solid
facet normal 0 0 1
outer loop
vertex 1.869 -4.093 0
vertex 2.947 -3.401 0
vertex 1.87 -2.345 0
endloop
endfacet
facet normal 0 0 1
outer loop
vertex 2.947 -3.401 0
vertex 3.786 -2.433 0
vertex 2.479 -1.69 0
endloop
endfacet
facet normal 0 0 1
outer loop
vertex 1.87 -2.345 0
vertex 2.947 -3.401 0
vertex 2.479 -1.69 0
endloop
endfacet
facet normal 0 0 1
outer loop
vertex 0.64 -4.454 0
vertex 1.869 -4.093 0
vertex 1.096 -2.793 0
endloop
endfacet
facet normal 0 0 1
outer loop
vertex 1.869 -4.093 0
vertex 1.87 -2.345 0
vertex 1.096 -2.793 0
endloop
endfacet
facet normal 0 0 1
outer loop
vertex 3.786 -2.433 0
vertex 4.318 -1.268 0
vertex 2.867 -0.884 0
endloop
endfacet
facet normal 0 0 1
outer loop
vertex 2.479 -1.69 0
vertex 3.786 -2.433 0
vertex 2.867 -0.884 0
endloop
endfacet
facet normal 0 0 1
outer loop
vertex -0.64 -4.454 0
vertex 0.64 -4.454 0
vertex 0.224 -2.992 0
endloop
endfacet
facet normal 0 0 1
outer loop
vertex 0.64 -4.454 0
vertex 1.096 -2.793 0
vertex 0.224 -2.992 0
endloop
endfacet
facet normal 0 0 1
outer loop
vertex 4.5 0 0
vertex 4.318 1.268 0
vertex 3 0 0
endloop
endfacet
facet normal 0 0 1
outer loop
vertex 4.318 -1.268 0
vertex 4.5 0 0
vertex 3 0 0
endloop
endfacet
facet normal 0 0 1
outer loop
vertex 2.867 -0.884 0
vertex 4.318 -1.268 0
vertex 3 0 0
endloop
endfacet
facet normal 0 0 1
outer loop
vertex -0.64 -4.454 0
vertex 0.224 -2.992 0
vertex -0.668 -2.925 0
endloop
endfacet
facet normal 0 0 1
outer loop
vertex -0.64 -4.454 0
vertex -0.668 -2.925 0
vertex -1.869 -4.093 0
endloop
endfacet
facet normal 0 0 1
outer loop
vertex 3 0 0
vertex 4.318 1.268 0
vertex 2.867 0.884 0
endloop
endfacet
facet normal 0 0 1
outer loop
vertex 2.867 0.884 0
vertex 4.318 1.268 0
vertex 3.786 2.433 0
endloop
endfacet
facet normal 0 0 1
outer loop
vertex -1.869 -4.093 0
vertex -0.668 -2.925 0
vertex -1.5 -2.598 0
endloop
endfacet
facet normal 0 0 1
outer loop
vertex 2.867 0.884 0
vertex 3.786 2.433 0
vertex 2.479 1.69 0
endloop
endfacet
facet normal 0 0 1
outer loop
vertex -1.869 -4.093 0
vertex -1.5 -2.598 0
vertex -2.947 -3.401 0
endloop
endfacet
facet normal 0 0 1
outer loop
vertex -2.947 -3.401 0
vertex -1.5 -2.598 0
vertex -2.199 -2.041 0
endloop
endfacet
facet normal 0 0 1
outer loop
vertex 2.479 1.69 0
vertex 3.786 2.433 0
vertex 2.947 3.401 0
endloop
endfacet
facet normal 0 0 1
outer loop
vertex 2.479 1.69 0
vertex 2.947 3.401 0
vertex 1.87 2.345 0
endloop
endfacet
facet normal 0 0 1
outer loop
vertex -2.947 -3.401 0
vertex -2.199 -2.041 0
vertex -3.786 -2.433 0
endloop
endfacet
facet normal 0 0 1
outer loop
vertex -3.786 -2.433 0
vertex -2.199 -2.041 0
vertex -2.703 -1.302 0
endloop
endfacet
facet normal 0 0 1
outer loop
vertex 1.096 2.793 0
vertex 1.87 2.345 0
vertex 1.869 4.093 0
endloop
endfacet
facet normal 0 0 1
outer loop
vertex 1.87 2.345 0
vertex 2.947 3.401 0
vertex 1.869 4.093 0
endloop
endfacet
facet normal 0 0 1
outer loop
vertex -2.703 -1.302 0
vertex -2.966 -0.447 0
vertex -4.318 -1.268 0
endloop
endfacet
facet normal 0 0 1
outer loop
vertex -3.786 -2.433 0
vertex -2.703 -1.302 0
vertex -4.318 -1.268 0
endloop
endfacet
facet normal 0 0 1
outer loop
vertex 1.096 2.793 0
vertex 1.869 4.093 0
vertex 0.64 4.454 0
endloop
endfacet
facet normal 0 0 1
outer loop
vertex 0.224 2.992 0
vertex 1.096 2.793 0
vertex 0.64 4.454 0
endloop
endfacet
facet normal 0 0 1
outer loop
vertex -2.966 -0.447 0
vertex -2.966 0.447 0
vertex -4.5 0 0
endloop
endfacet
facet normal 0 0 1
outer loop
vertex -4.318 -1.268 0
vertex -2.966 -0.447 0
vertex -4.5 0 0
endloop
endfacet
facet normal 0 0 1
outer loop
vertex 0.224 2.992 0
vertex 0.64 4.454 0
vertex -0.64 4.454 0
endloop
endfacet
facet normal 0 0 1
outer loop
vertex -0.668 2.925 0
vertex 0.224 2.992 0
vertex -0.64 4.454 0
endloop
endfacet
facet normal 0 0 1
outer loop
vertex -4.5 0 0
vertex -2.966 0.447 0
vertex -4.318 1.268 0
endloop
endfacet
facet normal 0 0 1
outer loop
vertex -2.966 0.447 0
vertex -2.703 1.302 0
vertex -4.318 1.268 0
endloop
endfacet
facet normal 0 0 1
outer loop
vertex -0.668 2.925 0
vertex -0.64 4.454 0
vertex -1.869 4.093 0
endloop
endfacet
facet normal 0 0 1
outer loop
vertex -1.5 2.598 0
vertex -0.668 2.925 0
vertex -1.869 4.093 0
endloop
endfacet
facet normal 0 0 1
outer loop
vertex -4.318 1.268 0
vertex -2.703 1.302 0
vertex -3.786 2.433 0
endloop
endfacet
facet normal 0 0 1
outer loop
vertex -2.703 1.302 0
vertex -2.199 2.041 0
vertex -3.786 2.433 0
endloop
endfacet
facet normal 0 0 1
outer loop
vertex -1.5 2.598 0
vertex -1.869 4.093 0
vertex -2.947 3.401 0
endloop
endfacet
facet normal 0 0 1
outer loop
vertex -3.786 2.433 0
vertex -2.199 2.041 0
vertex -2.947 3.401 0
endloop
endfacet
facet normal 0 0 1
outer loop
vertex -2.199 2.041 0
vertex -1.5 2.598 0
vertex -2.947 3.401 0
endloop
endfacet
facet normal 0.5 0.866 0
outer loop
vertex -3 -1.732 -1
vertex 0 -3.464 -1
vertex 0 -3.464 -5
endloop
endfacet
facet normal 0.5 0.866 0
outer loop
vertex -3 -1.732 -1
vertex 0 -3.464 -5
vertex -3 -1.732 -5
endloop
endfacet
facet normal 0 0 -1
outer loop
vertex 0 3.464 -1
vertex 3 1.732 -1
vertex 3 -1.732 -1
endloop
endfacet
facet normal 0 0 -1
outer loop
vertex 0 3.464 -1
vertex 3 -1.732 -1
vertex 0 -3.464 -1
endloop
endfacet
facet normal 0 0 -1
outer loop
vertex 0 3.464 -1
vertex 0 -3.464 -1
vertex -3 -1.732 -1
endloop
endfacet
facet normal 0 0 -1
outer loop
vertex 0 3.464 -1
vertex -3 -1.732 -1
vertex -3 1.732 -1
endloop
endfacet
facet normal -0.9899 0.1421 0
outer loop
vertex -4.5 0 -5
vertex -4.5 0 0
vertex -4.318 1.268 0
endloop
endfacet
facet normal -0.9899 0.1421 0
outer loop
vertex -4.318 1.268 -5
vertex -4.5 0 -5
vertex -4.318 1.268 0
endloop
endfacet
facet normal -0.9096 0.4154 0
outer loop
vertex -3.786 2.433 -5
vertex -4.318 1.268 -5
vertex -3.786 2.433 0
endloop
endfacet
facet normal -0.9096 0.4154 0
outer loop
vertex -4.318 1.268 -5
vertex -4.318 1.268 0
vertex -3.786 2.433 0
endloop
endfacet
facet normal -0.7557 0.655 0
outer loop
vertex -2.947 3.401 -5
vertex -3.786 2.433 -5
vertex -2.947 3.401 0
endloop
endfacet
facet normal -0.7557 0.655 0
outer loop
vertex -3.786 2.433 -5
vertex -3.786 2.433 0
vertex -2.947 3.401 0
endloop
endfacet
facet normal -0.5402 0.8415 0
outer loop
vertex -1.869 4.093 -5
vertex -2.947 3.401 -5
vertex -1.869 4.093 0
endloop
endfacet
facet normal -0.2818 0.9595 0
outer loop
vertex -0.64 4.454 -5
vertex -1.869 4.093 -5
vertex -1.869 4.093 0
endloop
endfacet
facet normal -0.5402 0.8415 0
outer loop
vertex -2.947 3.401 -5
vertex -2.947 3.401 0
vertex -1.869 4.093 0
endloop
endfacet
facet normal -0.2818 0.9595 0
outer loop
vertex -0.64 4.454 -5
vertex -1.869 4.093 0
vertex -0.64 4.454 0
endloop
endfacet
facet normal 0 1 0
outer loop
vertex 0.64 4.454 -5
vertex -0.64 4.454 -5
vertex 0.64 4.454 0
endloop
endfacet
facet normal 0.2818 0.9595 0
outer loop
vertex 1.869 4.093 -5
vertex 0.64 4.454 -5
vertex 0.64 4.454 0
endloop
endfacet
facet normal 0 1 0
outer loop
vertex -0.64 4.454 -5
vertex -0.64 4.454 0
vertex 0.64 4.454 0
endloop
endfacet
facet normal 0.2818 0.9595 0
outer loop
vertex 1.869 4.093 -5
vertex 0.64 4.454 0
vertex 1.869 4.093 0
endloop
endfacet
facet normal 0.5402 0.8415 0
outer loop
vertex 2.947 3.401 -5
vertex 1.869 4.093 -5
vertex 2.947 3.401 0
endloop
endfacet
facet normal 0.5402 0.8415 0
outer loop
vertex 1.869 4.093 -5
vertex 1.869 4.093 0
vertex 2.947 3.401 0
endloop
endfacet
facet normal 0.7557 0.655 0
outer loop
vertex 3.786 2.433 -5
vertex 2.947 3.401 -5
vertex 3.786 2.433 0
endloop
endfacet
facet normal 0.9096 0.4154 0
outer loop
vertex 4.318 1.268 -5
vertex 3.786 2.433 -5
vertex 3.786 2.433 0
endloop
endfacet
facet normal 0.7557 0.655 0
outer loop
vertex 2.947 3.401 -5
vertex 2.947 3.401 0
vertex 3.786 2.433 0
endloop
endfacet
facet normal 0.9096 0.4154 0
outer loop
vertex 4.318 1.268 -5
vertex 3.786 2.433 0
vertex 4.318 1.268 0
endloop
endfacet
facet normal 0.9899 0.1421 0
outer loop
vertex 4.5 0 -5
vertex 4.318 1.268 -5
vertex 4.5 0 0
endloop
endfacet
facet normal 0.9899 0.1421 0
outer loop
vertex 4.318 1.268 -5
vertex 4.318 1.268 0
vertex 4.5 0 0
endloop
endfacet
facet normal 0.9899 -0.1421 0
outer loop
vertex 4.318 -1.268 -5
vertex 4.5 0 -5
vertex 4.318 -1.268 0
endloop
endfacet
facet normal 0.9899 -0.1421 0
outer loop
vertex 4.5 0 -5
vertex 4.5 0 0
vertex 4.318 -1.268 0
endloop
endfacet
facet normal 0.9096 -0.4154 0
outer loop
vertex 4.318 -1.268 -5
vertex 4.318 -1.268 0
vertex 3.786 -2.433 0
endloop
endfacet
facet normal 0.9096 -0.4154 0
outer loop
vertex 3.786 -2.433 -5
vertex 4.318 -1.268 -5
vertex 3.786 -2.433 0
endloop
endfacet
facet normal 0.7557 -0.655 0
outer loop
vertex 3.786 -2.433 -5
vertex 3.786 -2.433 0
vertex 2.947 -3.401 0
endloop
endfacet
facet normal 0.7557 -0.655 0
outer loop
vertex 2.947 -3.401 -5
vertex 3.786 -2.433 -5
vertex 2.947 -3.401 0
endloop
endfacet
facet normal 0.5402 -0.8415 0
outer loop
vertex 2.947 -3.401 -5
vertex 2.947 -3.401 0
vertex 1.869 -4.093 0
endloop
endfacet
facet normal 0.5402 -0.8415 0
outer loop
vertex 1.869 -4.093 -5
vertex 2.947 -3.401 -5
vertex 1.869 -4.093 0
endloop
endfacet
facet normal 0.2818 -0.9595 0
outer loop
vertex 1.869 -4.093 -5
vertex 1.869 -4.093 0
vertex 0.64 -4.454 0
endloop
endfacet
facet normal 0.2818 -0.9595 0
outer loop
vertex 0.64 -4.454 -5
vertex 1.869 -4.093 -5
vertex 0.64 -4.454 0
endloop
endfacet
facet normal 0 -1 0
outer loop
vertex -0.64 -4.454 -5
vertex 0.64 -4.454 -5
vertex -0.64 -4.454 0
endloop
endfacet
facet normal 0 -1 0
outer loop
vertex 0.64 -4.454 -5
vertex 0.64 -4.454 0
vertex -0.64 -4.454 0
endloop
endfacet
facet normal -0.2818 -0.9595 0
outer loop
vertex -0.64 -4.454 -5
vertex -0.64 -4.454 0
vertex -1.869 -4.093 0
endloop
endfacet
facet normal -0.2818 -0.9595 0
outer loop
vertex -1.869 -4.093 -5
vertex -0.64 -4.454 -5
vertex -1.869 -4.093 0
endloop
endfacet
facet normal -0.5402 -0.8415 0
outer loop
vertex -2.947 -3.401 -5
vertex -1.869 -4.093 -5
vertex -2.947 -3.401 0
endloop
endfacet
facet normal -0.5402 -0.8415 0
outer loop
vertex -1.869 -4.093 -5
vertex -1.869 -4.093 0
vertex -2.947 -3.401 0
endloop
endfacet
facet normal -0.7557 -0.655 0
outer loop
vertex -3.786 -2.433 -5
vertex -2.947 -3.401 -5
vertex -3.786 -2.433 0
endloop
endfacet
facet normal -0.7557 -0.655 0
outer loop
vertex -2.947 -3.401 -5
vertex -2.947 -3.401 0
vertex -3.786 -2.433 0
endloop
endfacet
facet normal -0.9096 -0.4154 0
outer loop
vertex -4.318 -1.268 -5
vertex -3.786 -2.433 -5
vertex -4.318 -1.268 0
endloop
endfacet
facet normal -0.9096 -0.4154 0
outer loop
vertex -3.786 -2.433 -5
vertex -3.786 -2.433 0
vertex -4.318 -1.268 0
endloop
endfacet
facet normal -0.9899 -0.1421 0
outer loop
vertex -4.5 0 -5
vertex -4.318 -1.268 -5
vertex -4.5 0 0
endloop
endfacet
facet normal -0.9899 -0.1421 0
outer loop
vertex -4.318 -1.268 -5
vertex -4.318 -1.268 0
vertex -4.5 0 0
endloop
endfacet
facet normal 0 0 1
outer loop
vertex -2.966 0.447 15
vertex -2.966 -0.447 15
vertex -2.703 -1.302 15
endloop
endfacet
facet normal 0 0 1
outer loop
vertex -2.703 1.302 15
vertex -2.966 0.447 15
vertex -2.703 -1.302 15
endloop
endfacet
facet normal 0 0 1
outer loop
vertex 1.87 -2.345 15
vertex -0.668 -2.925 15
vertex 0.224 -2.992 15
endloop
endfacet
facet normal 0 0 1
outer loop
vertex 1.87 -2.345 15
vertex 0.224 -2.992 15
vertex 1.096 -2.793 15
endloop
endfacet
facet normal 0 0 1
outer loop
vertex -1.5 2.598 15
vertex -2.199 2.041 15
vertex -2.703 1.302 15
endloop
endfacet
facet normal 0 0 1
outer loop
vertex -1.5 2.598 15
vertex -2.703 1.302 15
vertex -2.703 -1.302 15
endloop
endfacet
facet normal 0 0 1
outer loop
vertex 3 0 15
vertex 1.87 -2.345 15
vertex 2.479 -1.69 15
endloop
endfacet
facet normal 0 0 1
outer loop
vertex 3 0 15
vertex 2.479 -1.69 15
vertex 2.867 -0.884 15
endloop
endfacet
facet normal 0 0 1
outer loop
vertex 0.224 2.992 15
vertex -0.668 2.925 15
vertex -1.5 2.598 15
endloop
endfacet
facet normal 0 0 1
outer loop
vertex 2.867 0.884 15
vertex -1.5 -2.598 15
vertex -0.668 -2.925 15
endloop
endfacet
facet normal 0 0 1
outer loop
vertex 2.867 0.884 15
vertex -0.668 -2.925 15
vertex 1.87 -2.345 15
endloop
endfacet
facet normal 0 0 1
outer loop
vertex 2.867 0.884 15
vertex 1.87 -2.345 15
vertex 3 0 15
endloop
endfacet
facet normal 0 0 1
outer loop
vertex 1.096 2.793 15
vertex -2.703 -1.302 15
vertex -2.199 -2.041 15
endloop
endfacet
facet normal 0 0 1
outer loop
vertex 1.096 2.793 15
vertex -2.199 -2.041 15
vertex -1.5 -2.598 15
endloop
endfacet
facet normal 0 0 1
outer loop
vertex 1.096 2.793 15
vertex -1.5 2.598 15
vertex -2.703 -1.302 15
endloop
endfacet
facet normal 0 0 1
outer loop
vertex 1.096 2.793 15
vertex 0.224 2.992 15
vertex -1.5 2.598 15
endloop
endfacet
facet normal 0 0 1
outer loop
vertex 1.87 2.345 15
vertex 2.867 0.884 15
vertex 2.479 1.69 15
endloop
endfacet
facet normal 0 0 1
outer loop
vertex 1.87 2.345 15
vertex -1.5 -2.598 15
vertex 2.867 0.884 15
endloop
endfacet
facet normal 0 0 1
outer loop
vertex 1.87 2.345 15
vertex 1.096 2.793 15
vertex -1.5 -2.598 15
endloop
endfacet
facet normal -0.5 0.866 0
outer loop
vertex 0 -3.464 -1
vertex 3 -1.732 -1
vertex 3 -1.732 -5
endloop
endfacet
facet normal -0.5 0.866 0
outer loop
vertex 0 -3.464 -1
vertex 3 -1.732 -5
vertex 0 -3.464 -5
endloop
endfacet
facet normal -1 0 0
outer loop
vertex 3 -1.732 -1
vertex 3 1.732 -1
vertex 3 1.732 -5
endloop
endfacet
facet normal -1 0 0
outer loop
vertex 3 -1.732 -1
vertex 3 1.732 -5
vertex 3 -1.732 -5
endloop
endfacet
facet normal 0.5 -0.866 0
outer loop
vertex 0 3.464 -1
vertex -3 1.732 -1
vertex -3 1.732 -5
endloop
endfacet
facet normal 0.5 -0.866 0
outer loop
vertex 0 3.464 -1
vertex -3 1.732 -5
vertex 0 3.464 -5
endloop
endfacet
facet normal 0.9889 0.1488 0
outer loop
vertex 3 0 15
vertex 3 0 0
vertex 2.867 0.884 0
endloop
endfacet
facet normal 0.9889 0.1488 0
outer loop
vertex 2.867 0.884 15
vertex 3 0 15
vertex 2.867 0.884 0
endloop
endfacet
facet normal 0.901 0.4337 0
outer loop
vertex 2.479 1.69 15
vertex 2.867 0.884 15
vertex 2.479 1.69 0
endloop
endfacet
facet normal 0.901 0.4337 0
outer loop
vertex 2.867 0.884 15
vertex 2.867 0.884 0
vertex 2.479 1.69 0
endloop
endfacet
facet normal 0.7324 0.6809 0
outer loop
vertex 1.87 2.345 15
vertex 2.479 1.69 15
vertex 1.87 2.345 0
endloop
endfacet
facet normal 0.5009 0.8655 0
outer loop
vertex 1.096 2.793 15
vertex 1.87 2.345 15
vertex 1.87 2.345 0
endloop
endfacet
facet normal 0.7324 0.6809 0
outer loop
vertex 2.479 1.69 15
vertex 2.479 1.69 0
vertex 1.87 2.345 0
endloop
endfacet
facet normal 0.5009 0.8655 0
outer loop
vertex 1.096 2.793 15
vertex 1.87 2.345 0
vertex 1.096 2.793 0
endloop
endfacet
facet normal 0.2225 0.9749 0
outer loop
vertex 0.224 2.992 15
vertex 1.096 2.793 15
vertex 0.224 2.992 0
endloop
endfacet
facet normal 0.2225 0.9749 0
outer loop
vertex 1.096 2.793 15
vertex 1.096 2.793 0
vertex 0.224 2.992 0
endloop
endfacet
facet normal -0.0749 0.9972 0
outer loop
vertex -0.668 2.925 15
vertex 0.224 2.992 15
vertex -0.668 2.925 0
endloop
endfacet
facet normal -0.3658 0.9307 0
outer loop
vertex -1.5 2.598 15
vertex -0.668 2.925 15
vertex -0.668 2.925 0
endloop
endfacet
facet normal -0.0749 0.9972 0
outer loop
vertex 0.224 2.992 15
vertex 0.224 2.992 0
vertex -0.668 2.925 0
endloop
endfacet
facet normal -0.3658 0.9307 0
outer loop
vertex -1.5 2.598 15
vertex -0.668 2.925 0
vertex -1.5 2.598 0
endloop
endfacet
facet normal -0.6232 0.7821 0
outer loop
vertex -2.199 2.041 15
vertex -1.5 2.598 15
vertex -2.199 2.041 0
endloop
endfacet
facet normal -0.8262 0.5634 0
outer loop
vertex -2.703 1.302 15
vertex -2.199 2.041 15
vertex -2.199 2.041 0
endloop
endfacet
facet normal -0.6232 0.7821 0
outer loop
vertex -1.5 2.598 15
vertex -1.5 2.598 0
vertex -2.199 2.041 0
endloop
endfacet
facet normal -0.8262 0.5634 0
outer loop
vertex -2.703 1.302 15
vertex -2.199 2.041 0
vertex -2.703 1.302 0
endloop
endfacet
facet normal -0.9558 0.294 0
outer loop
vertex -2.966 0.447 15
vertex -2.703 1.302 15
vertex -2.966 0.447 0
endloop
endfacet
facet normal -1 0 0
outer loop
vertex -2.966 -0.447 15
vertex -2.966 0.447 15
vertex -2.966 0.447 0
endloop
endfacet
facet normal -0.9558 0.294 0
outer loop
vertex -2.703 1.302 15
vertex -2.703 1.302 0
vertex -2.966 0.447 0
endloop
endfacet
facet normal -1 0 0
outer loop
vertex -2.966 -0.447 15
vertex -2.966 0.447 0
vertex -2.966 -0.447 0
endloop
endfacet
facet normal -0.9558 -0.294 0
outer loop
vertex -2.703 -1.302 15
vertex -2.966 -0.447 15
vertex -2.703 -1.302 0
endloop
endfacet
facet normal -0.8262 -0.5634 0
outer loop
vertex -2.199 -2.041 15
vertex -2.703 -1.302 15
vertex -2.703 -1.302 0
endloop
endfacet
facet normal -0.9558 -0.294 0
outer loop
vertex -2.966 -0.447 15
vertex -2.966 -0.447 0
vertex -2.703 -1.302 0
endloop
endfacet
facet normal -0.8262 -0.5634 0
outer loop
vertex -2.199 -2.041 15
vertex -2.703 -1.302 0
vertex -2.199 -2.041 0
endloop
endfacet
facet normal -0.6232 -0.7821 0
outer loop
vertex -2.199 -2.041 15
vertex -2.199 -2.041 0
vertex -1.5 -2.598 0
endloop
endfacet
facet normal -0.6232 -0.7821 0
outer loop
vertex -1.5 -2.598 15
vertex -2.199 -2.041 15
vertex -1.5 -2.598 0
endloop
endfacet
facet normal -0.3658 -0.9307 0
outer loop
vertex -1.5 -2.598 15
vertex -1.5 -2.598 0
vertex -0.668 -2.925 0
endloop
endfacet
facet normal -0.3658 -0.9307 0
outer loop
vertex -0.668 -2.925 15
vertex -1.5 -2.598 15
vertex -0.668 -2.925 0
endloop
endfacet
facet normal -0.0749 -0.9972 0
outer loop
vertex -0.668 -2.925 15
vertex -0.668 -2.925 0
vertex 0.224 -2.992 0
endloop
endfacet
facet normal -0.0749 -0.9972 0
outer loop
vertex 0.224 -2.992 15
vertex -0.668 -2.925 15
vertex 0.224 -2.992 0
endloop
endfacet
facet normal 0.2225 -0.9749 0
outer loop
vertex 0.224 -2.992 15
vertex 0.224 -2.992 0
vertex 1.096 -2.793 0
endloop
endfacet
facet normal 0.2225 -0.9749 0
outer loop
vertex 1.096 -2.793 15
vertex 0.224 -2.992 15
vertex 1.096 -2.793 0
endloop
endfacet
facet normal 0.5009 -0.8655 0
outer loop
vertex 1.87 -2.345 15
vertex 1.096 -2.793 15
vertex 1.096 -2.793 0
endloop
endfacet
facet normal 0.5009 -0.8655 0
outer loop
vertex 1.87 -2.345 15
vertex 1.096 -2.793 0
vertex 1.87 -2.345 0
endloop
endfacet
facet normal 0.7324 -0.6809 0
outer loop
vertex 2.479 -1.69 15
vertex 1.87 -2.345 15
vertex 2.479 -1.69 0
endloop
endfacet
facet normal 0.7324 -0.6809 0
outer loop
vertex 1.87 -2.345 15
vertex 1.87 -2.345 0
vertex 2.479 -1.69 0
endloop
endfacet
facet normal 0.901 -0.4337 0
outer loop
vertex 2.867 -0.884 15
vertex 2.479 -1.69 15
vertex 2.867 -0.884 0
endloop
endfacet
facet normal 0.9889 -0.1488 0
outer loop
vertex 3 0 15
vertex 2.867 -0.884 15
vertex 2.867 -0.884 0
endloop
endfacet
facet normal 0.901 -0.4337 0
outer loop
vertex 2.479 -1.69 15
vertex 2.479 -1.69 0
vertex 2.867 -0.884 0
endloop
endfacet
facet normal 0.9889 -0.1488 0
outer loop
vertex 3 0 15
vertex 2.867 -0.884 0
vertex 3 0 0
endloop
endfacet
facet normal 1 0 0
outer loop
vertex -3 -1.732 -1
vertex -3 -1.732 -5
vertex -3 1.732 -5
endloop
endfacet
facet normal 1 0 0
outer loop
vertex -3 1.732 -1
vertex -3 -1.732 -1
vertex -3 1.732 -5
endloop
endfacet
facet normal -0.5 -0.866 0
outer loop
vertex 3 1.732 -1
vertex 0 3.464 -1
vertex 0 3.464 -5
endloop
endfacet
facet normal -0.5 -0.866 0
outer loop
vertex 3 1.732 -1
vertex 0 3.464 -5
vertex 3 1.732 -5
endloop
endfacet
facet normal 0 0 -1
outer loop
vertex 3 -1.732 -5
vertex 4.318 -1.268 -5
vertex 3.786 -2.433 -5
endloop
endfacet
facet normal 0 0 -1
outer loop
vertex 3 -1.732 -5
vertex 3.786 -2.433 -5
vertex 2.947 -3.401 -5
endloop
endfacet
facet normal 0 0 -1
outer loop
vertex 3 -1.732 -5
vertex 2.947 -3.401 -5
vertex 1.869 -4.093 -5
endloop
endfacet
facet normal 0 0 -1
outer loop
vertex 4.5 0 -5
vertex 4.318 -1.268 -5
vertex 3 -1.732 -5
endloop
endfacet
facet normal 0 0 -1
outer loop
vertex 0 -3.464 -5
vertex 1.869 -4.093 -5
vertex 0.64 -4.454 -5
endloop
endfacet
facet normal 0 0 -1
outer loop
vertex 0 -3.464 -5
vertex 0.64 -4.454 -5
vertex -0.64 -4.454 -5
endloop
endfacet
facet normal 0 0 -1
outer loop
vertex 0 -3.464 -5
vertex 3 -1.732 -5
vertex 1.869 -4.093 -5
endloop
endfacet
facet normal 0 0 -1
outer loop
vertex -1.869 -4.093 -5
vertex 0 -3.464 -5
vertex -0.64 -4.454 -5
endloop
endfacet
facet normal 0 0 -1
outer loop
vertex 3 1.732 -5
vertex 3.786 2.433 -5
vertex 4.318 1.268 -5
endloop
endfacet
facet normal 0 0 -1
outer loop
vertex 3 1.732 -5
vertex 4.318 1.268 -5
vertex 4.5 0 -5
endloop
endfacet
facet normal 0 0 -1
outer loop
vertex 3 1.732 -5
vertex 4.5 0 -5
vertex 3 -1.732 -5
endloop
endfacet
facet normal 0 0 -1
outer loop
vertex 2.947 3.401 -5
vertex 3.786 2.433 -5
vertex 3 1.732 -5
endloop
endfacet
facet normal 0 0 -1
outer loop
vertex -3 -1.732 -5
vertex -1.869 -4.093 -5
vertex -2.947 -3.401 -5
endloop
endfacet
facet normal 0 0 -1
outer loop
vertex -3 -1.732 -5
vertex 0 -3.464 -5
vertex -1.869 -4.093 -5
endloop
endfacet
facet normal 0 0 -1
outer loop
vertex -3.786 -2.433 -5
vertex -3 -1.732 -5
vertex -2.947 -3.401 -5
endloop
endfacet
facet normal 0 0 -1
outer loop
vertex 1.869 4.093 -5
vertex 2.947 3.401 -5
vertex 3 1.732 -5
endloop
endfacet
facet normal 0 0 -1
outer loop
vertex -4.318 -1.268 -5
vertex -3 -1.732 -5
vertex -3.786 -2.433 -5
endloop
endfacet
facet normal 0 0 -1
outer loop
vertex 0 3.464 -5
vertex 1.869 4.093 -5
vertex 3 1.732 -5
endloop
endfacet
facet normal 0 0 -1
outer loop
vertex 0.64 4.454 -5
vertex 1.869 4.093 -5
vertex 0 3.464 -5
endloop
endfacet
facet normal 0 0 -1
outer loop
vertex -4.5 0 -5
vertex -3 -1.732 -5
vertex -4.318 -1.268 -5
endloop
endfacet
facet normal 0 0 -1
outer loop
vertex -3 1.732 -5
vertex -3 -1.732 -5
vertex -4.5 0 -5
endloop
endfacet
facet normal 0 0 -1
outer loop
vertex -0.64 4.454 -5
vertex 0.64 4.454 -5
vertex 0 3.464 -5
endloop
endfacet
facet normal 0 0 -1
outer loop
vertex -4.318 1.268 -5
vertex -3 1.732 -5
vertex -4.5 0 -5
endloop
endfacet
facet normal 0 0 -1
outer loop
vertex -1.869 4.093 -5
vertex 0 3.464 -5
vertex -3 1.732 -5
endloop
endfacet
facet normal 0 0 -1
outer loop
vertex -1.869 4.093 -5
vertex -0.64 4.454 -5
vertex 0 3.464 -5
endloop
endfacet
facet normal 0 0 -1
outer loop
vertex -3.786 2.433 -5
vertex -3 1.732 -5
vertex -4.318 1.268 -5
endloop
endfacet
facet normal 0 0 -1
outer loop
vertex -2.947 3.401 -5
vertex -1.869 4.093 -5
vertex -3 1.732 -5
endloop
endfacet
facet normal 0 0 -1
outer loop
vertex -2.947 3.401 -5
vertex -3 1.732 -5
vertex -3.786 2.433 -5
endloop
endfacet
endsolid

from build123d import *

# Parameters (mm, degrees)
ESQUISSE1_R                  = 3
BASE_EXTRUSION_DEPTH         = 15
ESQUISSE2_R                  = 4.5
BOSS_EXTRU_1_DEPTH           = 5
ENL_V_MAT_EXTRU_3_DEPTH      = 4
R_P_TITION_CIRCULAIRE1_COUNT = 6


with BuildPart() as part:
    # Esquisse1 → Base-Extrusion (new body)
    with BuildSketch(Plane.XY):
        Circle(ESQUISSE1_R)
    extrude(amount=BASE_EXTRUSION_DEPTH)

    # Esquisse2 → Boss.-Extru.1 (add)
    with BuildSketch(Plane(origin=(0, 0, 0), x_dir=(-1, 0, 0), z_dir=(0, 0, -1))):
        Circle(ESQUISSE2_R)
    extrude(amount=BOSS_EXTRU_1_DEPTH)

    # Esquisse3 → Enlèv. mat.-Extru.3 (cut)
    with BuildSketch(Plane(origin=(0, 0, -5), x_dir=(-1, 0, 0), z_dir=(0, 0, -1))):
        Polygon((3, 1.732050808), (0, 0), (3, -1.732050808), align=None)
    enl_v_mat_extru_3 = extrude(amount=-ENL_V_MAT_EXTRU_3_DEPTH, mode=Mode.SUBTRACT)

    # Répétition circulaire1: Enlèv. mat.-Extru.3 ×6 about axis
    r_p_tition_circulaire1_axis = Axis((0, 0, 0), (0, 0, 1))
    for i in range(1, R_P_TITION_CIRCULAIRE1_COUNT):
        add(enl_v_mat_extru_3.rotate(r_p_tition_circulaire1_axis, i * 360 / R_P_TITION_CIRCULAIRE1_COUNT), mode=Mode.SUBTRACT)


solid = part.part
